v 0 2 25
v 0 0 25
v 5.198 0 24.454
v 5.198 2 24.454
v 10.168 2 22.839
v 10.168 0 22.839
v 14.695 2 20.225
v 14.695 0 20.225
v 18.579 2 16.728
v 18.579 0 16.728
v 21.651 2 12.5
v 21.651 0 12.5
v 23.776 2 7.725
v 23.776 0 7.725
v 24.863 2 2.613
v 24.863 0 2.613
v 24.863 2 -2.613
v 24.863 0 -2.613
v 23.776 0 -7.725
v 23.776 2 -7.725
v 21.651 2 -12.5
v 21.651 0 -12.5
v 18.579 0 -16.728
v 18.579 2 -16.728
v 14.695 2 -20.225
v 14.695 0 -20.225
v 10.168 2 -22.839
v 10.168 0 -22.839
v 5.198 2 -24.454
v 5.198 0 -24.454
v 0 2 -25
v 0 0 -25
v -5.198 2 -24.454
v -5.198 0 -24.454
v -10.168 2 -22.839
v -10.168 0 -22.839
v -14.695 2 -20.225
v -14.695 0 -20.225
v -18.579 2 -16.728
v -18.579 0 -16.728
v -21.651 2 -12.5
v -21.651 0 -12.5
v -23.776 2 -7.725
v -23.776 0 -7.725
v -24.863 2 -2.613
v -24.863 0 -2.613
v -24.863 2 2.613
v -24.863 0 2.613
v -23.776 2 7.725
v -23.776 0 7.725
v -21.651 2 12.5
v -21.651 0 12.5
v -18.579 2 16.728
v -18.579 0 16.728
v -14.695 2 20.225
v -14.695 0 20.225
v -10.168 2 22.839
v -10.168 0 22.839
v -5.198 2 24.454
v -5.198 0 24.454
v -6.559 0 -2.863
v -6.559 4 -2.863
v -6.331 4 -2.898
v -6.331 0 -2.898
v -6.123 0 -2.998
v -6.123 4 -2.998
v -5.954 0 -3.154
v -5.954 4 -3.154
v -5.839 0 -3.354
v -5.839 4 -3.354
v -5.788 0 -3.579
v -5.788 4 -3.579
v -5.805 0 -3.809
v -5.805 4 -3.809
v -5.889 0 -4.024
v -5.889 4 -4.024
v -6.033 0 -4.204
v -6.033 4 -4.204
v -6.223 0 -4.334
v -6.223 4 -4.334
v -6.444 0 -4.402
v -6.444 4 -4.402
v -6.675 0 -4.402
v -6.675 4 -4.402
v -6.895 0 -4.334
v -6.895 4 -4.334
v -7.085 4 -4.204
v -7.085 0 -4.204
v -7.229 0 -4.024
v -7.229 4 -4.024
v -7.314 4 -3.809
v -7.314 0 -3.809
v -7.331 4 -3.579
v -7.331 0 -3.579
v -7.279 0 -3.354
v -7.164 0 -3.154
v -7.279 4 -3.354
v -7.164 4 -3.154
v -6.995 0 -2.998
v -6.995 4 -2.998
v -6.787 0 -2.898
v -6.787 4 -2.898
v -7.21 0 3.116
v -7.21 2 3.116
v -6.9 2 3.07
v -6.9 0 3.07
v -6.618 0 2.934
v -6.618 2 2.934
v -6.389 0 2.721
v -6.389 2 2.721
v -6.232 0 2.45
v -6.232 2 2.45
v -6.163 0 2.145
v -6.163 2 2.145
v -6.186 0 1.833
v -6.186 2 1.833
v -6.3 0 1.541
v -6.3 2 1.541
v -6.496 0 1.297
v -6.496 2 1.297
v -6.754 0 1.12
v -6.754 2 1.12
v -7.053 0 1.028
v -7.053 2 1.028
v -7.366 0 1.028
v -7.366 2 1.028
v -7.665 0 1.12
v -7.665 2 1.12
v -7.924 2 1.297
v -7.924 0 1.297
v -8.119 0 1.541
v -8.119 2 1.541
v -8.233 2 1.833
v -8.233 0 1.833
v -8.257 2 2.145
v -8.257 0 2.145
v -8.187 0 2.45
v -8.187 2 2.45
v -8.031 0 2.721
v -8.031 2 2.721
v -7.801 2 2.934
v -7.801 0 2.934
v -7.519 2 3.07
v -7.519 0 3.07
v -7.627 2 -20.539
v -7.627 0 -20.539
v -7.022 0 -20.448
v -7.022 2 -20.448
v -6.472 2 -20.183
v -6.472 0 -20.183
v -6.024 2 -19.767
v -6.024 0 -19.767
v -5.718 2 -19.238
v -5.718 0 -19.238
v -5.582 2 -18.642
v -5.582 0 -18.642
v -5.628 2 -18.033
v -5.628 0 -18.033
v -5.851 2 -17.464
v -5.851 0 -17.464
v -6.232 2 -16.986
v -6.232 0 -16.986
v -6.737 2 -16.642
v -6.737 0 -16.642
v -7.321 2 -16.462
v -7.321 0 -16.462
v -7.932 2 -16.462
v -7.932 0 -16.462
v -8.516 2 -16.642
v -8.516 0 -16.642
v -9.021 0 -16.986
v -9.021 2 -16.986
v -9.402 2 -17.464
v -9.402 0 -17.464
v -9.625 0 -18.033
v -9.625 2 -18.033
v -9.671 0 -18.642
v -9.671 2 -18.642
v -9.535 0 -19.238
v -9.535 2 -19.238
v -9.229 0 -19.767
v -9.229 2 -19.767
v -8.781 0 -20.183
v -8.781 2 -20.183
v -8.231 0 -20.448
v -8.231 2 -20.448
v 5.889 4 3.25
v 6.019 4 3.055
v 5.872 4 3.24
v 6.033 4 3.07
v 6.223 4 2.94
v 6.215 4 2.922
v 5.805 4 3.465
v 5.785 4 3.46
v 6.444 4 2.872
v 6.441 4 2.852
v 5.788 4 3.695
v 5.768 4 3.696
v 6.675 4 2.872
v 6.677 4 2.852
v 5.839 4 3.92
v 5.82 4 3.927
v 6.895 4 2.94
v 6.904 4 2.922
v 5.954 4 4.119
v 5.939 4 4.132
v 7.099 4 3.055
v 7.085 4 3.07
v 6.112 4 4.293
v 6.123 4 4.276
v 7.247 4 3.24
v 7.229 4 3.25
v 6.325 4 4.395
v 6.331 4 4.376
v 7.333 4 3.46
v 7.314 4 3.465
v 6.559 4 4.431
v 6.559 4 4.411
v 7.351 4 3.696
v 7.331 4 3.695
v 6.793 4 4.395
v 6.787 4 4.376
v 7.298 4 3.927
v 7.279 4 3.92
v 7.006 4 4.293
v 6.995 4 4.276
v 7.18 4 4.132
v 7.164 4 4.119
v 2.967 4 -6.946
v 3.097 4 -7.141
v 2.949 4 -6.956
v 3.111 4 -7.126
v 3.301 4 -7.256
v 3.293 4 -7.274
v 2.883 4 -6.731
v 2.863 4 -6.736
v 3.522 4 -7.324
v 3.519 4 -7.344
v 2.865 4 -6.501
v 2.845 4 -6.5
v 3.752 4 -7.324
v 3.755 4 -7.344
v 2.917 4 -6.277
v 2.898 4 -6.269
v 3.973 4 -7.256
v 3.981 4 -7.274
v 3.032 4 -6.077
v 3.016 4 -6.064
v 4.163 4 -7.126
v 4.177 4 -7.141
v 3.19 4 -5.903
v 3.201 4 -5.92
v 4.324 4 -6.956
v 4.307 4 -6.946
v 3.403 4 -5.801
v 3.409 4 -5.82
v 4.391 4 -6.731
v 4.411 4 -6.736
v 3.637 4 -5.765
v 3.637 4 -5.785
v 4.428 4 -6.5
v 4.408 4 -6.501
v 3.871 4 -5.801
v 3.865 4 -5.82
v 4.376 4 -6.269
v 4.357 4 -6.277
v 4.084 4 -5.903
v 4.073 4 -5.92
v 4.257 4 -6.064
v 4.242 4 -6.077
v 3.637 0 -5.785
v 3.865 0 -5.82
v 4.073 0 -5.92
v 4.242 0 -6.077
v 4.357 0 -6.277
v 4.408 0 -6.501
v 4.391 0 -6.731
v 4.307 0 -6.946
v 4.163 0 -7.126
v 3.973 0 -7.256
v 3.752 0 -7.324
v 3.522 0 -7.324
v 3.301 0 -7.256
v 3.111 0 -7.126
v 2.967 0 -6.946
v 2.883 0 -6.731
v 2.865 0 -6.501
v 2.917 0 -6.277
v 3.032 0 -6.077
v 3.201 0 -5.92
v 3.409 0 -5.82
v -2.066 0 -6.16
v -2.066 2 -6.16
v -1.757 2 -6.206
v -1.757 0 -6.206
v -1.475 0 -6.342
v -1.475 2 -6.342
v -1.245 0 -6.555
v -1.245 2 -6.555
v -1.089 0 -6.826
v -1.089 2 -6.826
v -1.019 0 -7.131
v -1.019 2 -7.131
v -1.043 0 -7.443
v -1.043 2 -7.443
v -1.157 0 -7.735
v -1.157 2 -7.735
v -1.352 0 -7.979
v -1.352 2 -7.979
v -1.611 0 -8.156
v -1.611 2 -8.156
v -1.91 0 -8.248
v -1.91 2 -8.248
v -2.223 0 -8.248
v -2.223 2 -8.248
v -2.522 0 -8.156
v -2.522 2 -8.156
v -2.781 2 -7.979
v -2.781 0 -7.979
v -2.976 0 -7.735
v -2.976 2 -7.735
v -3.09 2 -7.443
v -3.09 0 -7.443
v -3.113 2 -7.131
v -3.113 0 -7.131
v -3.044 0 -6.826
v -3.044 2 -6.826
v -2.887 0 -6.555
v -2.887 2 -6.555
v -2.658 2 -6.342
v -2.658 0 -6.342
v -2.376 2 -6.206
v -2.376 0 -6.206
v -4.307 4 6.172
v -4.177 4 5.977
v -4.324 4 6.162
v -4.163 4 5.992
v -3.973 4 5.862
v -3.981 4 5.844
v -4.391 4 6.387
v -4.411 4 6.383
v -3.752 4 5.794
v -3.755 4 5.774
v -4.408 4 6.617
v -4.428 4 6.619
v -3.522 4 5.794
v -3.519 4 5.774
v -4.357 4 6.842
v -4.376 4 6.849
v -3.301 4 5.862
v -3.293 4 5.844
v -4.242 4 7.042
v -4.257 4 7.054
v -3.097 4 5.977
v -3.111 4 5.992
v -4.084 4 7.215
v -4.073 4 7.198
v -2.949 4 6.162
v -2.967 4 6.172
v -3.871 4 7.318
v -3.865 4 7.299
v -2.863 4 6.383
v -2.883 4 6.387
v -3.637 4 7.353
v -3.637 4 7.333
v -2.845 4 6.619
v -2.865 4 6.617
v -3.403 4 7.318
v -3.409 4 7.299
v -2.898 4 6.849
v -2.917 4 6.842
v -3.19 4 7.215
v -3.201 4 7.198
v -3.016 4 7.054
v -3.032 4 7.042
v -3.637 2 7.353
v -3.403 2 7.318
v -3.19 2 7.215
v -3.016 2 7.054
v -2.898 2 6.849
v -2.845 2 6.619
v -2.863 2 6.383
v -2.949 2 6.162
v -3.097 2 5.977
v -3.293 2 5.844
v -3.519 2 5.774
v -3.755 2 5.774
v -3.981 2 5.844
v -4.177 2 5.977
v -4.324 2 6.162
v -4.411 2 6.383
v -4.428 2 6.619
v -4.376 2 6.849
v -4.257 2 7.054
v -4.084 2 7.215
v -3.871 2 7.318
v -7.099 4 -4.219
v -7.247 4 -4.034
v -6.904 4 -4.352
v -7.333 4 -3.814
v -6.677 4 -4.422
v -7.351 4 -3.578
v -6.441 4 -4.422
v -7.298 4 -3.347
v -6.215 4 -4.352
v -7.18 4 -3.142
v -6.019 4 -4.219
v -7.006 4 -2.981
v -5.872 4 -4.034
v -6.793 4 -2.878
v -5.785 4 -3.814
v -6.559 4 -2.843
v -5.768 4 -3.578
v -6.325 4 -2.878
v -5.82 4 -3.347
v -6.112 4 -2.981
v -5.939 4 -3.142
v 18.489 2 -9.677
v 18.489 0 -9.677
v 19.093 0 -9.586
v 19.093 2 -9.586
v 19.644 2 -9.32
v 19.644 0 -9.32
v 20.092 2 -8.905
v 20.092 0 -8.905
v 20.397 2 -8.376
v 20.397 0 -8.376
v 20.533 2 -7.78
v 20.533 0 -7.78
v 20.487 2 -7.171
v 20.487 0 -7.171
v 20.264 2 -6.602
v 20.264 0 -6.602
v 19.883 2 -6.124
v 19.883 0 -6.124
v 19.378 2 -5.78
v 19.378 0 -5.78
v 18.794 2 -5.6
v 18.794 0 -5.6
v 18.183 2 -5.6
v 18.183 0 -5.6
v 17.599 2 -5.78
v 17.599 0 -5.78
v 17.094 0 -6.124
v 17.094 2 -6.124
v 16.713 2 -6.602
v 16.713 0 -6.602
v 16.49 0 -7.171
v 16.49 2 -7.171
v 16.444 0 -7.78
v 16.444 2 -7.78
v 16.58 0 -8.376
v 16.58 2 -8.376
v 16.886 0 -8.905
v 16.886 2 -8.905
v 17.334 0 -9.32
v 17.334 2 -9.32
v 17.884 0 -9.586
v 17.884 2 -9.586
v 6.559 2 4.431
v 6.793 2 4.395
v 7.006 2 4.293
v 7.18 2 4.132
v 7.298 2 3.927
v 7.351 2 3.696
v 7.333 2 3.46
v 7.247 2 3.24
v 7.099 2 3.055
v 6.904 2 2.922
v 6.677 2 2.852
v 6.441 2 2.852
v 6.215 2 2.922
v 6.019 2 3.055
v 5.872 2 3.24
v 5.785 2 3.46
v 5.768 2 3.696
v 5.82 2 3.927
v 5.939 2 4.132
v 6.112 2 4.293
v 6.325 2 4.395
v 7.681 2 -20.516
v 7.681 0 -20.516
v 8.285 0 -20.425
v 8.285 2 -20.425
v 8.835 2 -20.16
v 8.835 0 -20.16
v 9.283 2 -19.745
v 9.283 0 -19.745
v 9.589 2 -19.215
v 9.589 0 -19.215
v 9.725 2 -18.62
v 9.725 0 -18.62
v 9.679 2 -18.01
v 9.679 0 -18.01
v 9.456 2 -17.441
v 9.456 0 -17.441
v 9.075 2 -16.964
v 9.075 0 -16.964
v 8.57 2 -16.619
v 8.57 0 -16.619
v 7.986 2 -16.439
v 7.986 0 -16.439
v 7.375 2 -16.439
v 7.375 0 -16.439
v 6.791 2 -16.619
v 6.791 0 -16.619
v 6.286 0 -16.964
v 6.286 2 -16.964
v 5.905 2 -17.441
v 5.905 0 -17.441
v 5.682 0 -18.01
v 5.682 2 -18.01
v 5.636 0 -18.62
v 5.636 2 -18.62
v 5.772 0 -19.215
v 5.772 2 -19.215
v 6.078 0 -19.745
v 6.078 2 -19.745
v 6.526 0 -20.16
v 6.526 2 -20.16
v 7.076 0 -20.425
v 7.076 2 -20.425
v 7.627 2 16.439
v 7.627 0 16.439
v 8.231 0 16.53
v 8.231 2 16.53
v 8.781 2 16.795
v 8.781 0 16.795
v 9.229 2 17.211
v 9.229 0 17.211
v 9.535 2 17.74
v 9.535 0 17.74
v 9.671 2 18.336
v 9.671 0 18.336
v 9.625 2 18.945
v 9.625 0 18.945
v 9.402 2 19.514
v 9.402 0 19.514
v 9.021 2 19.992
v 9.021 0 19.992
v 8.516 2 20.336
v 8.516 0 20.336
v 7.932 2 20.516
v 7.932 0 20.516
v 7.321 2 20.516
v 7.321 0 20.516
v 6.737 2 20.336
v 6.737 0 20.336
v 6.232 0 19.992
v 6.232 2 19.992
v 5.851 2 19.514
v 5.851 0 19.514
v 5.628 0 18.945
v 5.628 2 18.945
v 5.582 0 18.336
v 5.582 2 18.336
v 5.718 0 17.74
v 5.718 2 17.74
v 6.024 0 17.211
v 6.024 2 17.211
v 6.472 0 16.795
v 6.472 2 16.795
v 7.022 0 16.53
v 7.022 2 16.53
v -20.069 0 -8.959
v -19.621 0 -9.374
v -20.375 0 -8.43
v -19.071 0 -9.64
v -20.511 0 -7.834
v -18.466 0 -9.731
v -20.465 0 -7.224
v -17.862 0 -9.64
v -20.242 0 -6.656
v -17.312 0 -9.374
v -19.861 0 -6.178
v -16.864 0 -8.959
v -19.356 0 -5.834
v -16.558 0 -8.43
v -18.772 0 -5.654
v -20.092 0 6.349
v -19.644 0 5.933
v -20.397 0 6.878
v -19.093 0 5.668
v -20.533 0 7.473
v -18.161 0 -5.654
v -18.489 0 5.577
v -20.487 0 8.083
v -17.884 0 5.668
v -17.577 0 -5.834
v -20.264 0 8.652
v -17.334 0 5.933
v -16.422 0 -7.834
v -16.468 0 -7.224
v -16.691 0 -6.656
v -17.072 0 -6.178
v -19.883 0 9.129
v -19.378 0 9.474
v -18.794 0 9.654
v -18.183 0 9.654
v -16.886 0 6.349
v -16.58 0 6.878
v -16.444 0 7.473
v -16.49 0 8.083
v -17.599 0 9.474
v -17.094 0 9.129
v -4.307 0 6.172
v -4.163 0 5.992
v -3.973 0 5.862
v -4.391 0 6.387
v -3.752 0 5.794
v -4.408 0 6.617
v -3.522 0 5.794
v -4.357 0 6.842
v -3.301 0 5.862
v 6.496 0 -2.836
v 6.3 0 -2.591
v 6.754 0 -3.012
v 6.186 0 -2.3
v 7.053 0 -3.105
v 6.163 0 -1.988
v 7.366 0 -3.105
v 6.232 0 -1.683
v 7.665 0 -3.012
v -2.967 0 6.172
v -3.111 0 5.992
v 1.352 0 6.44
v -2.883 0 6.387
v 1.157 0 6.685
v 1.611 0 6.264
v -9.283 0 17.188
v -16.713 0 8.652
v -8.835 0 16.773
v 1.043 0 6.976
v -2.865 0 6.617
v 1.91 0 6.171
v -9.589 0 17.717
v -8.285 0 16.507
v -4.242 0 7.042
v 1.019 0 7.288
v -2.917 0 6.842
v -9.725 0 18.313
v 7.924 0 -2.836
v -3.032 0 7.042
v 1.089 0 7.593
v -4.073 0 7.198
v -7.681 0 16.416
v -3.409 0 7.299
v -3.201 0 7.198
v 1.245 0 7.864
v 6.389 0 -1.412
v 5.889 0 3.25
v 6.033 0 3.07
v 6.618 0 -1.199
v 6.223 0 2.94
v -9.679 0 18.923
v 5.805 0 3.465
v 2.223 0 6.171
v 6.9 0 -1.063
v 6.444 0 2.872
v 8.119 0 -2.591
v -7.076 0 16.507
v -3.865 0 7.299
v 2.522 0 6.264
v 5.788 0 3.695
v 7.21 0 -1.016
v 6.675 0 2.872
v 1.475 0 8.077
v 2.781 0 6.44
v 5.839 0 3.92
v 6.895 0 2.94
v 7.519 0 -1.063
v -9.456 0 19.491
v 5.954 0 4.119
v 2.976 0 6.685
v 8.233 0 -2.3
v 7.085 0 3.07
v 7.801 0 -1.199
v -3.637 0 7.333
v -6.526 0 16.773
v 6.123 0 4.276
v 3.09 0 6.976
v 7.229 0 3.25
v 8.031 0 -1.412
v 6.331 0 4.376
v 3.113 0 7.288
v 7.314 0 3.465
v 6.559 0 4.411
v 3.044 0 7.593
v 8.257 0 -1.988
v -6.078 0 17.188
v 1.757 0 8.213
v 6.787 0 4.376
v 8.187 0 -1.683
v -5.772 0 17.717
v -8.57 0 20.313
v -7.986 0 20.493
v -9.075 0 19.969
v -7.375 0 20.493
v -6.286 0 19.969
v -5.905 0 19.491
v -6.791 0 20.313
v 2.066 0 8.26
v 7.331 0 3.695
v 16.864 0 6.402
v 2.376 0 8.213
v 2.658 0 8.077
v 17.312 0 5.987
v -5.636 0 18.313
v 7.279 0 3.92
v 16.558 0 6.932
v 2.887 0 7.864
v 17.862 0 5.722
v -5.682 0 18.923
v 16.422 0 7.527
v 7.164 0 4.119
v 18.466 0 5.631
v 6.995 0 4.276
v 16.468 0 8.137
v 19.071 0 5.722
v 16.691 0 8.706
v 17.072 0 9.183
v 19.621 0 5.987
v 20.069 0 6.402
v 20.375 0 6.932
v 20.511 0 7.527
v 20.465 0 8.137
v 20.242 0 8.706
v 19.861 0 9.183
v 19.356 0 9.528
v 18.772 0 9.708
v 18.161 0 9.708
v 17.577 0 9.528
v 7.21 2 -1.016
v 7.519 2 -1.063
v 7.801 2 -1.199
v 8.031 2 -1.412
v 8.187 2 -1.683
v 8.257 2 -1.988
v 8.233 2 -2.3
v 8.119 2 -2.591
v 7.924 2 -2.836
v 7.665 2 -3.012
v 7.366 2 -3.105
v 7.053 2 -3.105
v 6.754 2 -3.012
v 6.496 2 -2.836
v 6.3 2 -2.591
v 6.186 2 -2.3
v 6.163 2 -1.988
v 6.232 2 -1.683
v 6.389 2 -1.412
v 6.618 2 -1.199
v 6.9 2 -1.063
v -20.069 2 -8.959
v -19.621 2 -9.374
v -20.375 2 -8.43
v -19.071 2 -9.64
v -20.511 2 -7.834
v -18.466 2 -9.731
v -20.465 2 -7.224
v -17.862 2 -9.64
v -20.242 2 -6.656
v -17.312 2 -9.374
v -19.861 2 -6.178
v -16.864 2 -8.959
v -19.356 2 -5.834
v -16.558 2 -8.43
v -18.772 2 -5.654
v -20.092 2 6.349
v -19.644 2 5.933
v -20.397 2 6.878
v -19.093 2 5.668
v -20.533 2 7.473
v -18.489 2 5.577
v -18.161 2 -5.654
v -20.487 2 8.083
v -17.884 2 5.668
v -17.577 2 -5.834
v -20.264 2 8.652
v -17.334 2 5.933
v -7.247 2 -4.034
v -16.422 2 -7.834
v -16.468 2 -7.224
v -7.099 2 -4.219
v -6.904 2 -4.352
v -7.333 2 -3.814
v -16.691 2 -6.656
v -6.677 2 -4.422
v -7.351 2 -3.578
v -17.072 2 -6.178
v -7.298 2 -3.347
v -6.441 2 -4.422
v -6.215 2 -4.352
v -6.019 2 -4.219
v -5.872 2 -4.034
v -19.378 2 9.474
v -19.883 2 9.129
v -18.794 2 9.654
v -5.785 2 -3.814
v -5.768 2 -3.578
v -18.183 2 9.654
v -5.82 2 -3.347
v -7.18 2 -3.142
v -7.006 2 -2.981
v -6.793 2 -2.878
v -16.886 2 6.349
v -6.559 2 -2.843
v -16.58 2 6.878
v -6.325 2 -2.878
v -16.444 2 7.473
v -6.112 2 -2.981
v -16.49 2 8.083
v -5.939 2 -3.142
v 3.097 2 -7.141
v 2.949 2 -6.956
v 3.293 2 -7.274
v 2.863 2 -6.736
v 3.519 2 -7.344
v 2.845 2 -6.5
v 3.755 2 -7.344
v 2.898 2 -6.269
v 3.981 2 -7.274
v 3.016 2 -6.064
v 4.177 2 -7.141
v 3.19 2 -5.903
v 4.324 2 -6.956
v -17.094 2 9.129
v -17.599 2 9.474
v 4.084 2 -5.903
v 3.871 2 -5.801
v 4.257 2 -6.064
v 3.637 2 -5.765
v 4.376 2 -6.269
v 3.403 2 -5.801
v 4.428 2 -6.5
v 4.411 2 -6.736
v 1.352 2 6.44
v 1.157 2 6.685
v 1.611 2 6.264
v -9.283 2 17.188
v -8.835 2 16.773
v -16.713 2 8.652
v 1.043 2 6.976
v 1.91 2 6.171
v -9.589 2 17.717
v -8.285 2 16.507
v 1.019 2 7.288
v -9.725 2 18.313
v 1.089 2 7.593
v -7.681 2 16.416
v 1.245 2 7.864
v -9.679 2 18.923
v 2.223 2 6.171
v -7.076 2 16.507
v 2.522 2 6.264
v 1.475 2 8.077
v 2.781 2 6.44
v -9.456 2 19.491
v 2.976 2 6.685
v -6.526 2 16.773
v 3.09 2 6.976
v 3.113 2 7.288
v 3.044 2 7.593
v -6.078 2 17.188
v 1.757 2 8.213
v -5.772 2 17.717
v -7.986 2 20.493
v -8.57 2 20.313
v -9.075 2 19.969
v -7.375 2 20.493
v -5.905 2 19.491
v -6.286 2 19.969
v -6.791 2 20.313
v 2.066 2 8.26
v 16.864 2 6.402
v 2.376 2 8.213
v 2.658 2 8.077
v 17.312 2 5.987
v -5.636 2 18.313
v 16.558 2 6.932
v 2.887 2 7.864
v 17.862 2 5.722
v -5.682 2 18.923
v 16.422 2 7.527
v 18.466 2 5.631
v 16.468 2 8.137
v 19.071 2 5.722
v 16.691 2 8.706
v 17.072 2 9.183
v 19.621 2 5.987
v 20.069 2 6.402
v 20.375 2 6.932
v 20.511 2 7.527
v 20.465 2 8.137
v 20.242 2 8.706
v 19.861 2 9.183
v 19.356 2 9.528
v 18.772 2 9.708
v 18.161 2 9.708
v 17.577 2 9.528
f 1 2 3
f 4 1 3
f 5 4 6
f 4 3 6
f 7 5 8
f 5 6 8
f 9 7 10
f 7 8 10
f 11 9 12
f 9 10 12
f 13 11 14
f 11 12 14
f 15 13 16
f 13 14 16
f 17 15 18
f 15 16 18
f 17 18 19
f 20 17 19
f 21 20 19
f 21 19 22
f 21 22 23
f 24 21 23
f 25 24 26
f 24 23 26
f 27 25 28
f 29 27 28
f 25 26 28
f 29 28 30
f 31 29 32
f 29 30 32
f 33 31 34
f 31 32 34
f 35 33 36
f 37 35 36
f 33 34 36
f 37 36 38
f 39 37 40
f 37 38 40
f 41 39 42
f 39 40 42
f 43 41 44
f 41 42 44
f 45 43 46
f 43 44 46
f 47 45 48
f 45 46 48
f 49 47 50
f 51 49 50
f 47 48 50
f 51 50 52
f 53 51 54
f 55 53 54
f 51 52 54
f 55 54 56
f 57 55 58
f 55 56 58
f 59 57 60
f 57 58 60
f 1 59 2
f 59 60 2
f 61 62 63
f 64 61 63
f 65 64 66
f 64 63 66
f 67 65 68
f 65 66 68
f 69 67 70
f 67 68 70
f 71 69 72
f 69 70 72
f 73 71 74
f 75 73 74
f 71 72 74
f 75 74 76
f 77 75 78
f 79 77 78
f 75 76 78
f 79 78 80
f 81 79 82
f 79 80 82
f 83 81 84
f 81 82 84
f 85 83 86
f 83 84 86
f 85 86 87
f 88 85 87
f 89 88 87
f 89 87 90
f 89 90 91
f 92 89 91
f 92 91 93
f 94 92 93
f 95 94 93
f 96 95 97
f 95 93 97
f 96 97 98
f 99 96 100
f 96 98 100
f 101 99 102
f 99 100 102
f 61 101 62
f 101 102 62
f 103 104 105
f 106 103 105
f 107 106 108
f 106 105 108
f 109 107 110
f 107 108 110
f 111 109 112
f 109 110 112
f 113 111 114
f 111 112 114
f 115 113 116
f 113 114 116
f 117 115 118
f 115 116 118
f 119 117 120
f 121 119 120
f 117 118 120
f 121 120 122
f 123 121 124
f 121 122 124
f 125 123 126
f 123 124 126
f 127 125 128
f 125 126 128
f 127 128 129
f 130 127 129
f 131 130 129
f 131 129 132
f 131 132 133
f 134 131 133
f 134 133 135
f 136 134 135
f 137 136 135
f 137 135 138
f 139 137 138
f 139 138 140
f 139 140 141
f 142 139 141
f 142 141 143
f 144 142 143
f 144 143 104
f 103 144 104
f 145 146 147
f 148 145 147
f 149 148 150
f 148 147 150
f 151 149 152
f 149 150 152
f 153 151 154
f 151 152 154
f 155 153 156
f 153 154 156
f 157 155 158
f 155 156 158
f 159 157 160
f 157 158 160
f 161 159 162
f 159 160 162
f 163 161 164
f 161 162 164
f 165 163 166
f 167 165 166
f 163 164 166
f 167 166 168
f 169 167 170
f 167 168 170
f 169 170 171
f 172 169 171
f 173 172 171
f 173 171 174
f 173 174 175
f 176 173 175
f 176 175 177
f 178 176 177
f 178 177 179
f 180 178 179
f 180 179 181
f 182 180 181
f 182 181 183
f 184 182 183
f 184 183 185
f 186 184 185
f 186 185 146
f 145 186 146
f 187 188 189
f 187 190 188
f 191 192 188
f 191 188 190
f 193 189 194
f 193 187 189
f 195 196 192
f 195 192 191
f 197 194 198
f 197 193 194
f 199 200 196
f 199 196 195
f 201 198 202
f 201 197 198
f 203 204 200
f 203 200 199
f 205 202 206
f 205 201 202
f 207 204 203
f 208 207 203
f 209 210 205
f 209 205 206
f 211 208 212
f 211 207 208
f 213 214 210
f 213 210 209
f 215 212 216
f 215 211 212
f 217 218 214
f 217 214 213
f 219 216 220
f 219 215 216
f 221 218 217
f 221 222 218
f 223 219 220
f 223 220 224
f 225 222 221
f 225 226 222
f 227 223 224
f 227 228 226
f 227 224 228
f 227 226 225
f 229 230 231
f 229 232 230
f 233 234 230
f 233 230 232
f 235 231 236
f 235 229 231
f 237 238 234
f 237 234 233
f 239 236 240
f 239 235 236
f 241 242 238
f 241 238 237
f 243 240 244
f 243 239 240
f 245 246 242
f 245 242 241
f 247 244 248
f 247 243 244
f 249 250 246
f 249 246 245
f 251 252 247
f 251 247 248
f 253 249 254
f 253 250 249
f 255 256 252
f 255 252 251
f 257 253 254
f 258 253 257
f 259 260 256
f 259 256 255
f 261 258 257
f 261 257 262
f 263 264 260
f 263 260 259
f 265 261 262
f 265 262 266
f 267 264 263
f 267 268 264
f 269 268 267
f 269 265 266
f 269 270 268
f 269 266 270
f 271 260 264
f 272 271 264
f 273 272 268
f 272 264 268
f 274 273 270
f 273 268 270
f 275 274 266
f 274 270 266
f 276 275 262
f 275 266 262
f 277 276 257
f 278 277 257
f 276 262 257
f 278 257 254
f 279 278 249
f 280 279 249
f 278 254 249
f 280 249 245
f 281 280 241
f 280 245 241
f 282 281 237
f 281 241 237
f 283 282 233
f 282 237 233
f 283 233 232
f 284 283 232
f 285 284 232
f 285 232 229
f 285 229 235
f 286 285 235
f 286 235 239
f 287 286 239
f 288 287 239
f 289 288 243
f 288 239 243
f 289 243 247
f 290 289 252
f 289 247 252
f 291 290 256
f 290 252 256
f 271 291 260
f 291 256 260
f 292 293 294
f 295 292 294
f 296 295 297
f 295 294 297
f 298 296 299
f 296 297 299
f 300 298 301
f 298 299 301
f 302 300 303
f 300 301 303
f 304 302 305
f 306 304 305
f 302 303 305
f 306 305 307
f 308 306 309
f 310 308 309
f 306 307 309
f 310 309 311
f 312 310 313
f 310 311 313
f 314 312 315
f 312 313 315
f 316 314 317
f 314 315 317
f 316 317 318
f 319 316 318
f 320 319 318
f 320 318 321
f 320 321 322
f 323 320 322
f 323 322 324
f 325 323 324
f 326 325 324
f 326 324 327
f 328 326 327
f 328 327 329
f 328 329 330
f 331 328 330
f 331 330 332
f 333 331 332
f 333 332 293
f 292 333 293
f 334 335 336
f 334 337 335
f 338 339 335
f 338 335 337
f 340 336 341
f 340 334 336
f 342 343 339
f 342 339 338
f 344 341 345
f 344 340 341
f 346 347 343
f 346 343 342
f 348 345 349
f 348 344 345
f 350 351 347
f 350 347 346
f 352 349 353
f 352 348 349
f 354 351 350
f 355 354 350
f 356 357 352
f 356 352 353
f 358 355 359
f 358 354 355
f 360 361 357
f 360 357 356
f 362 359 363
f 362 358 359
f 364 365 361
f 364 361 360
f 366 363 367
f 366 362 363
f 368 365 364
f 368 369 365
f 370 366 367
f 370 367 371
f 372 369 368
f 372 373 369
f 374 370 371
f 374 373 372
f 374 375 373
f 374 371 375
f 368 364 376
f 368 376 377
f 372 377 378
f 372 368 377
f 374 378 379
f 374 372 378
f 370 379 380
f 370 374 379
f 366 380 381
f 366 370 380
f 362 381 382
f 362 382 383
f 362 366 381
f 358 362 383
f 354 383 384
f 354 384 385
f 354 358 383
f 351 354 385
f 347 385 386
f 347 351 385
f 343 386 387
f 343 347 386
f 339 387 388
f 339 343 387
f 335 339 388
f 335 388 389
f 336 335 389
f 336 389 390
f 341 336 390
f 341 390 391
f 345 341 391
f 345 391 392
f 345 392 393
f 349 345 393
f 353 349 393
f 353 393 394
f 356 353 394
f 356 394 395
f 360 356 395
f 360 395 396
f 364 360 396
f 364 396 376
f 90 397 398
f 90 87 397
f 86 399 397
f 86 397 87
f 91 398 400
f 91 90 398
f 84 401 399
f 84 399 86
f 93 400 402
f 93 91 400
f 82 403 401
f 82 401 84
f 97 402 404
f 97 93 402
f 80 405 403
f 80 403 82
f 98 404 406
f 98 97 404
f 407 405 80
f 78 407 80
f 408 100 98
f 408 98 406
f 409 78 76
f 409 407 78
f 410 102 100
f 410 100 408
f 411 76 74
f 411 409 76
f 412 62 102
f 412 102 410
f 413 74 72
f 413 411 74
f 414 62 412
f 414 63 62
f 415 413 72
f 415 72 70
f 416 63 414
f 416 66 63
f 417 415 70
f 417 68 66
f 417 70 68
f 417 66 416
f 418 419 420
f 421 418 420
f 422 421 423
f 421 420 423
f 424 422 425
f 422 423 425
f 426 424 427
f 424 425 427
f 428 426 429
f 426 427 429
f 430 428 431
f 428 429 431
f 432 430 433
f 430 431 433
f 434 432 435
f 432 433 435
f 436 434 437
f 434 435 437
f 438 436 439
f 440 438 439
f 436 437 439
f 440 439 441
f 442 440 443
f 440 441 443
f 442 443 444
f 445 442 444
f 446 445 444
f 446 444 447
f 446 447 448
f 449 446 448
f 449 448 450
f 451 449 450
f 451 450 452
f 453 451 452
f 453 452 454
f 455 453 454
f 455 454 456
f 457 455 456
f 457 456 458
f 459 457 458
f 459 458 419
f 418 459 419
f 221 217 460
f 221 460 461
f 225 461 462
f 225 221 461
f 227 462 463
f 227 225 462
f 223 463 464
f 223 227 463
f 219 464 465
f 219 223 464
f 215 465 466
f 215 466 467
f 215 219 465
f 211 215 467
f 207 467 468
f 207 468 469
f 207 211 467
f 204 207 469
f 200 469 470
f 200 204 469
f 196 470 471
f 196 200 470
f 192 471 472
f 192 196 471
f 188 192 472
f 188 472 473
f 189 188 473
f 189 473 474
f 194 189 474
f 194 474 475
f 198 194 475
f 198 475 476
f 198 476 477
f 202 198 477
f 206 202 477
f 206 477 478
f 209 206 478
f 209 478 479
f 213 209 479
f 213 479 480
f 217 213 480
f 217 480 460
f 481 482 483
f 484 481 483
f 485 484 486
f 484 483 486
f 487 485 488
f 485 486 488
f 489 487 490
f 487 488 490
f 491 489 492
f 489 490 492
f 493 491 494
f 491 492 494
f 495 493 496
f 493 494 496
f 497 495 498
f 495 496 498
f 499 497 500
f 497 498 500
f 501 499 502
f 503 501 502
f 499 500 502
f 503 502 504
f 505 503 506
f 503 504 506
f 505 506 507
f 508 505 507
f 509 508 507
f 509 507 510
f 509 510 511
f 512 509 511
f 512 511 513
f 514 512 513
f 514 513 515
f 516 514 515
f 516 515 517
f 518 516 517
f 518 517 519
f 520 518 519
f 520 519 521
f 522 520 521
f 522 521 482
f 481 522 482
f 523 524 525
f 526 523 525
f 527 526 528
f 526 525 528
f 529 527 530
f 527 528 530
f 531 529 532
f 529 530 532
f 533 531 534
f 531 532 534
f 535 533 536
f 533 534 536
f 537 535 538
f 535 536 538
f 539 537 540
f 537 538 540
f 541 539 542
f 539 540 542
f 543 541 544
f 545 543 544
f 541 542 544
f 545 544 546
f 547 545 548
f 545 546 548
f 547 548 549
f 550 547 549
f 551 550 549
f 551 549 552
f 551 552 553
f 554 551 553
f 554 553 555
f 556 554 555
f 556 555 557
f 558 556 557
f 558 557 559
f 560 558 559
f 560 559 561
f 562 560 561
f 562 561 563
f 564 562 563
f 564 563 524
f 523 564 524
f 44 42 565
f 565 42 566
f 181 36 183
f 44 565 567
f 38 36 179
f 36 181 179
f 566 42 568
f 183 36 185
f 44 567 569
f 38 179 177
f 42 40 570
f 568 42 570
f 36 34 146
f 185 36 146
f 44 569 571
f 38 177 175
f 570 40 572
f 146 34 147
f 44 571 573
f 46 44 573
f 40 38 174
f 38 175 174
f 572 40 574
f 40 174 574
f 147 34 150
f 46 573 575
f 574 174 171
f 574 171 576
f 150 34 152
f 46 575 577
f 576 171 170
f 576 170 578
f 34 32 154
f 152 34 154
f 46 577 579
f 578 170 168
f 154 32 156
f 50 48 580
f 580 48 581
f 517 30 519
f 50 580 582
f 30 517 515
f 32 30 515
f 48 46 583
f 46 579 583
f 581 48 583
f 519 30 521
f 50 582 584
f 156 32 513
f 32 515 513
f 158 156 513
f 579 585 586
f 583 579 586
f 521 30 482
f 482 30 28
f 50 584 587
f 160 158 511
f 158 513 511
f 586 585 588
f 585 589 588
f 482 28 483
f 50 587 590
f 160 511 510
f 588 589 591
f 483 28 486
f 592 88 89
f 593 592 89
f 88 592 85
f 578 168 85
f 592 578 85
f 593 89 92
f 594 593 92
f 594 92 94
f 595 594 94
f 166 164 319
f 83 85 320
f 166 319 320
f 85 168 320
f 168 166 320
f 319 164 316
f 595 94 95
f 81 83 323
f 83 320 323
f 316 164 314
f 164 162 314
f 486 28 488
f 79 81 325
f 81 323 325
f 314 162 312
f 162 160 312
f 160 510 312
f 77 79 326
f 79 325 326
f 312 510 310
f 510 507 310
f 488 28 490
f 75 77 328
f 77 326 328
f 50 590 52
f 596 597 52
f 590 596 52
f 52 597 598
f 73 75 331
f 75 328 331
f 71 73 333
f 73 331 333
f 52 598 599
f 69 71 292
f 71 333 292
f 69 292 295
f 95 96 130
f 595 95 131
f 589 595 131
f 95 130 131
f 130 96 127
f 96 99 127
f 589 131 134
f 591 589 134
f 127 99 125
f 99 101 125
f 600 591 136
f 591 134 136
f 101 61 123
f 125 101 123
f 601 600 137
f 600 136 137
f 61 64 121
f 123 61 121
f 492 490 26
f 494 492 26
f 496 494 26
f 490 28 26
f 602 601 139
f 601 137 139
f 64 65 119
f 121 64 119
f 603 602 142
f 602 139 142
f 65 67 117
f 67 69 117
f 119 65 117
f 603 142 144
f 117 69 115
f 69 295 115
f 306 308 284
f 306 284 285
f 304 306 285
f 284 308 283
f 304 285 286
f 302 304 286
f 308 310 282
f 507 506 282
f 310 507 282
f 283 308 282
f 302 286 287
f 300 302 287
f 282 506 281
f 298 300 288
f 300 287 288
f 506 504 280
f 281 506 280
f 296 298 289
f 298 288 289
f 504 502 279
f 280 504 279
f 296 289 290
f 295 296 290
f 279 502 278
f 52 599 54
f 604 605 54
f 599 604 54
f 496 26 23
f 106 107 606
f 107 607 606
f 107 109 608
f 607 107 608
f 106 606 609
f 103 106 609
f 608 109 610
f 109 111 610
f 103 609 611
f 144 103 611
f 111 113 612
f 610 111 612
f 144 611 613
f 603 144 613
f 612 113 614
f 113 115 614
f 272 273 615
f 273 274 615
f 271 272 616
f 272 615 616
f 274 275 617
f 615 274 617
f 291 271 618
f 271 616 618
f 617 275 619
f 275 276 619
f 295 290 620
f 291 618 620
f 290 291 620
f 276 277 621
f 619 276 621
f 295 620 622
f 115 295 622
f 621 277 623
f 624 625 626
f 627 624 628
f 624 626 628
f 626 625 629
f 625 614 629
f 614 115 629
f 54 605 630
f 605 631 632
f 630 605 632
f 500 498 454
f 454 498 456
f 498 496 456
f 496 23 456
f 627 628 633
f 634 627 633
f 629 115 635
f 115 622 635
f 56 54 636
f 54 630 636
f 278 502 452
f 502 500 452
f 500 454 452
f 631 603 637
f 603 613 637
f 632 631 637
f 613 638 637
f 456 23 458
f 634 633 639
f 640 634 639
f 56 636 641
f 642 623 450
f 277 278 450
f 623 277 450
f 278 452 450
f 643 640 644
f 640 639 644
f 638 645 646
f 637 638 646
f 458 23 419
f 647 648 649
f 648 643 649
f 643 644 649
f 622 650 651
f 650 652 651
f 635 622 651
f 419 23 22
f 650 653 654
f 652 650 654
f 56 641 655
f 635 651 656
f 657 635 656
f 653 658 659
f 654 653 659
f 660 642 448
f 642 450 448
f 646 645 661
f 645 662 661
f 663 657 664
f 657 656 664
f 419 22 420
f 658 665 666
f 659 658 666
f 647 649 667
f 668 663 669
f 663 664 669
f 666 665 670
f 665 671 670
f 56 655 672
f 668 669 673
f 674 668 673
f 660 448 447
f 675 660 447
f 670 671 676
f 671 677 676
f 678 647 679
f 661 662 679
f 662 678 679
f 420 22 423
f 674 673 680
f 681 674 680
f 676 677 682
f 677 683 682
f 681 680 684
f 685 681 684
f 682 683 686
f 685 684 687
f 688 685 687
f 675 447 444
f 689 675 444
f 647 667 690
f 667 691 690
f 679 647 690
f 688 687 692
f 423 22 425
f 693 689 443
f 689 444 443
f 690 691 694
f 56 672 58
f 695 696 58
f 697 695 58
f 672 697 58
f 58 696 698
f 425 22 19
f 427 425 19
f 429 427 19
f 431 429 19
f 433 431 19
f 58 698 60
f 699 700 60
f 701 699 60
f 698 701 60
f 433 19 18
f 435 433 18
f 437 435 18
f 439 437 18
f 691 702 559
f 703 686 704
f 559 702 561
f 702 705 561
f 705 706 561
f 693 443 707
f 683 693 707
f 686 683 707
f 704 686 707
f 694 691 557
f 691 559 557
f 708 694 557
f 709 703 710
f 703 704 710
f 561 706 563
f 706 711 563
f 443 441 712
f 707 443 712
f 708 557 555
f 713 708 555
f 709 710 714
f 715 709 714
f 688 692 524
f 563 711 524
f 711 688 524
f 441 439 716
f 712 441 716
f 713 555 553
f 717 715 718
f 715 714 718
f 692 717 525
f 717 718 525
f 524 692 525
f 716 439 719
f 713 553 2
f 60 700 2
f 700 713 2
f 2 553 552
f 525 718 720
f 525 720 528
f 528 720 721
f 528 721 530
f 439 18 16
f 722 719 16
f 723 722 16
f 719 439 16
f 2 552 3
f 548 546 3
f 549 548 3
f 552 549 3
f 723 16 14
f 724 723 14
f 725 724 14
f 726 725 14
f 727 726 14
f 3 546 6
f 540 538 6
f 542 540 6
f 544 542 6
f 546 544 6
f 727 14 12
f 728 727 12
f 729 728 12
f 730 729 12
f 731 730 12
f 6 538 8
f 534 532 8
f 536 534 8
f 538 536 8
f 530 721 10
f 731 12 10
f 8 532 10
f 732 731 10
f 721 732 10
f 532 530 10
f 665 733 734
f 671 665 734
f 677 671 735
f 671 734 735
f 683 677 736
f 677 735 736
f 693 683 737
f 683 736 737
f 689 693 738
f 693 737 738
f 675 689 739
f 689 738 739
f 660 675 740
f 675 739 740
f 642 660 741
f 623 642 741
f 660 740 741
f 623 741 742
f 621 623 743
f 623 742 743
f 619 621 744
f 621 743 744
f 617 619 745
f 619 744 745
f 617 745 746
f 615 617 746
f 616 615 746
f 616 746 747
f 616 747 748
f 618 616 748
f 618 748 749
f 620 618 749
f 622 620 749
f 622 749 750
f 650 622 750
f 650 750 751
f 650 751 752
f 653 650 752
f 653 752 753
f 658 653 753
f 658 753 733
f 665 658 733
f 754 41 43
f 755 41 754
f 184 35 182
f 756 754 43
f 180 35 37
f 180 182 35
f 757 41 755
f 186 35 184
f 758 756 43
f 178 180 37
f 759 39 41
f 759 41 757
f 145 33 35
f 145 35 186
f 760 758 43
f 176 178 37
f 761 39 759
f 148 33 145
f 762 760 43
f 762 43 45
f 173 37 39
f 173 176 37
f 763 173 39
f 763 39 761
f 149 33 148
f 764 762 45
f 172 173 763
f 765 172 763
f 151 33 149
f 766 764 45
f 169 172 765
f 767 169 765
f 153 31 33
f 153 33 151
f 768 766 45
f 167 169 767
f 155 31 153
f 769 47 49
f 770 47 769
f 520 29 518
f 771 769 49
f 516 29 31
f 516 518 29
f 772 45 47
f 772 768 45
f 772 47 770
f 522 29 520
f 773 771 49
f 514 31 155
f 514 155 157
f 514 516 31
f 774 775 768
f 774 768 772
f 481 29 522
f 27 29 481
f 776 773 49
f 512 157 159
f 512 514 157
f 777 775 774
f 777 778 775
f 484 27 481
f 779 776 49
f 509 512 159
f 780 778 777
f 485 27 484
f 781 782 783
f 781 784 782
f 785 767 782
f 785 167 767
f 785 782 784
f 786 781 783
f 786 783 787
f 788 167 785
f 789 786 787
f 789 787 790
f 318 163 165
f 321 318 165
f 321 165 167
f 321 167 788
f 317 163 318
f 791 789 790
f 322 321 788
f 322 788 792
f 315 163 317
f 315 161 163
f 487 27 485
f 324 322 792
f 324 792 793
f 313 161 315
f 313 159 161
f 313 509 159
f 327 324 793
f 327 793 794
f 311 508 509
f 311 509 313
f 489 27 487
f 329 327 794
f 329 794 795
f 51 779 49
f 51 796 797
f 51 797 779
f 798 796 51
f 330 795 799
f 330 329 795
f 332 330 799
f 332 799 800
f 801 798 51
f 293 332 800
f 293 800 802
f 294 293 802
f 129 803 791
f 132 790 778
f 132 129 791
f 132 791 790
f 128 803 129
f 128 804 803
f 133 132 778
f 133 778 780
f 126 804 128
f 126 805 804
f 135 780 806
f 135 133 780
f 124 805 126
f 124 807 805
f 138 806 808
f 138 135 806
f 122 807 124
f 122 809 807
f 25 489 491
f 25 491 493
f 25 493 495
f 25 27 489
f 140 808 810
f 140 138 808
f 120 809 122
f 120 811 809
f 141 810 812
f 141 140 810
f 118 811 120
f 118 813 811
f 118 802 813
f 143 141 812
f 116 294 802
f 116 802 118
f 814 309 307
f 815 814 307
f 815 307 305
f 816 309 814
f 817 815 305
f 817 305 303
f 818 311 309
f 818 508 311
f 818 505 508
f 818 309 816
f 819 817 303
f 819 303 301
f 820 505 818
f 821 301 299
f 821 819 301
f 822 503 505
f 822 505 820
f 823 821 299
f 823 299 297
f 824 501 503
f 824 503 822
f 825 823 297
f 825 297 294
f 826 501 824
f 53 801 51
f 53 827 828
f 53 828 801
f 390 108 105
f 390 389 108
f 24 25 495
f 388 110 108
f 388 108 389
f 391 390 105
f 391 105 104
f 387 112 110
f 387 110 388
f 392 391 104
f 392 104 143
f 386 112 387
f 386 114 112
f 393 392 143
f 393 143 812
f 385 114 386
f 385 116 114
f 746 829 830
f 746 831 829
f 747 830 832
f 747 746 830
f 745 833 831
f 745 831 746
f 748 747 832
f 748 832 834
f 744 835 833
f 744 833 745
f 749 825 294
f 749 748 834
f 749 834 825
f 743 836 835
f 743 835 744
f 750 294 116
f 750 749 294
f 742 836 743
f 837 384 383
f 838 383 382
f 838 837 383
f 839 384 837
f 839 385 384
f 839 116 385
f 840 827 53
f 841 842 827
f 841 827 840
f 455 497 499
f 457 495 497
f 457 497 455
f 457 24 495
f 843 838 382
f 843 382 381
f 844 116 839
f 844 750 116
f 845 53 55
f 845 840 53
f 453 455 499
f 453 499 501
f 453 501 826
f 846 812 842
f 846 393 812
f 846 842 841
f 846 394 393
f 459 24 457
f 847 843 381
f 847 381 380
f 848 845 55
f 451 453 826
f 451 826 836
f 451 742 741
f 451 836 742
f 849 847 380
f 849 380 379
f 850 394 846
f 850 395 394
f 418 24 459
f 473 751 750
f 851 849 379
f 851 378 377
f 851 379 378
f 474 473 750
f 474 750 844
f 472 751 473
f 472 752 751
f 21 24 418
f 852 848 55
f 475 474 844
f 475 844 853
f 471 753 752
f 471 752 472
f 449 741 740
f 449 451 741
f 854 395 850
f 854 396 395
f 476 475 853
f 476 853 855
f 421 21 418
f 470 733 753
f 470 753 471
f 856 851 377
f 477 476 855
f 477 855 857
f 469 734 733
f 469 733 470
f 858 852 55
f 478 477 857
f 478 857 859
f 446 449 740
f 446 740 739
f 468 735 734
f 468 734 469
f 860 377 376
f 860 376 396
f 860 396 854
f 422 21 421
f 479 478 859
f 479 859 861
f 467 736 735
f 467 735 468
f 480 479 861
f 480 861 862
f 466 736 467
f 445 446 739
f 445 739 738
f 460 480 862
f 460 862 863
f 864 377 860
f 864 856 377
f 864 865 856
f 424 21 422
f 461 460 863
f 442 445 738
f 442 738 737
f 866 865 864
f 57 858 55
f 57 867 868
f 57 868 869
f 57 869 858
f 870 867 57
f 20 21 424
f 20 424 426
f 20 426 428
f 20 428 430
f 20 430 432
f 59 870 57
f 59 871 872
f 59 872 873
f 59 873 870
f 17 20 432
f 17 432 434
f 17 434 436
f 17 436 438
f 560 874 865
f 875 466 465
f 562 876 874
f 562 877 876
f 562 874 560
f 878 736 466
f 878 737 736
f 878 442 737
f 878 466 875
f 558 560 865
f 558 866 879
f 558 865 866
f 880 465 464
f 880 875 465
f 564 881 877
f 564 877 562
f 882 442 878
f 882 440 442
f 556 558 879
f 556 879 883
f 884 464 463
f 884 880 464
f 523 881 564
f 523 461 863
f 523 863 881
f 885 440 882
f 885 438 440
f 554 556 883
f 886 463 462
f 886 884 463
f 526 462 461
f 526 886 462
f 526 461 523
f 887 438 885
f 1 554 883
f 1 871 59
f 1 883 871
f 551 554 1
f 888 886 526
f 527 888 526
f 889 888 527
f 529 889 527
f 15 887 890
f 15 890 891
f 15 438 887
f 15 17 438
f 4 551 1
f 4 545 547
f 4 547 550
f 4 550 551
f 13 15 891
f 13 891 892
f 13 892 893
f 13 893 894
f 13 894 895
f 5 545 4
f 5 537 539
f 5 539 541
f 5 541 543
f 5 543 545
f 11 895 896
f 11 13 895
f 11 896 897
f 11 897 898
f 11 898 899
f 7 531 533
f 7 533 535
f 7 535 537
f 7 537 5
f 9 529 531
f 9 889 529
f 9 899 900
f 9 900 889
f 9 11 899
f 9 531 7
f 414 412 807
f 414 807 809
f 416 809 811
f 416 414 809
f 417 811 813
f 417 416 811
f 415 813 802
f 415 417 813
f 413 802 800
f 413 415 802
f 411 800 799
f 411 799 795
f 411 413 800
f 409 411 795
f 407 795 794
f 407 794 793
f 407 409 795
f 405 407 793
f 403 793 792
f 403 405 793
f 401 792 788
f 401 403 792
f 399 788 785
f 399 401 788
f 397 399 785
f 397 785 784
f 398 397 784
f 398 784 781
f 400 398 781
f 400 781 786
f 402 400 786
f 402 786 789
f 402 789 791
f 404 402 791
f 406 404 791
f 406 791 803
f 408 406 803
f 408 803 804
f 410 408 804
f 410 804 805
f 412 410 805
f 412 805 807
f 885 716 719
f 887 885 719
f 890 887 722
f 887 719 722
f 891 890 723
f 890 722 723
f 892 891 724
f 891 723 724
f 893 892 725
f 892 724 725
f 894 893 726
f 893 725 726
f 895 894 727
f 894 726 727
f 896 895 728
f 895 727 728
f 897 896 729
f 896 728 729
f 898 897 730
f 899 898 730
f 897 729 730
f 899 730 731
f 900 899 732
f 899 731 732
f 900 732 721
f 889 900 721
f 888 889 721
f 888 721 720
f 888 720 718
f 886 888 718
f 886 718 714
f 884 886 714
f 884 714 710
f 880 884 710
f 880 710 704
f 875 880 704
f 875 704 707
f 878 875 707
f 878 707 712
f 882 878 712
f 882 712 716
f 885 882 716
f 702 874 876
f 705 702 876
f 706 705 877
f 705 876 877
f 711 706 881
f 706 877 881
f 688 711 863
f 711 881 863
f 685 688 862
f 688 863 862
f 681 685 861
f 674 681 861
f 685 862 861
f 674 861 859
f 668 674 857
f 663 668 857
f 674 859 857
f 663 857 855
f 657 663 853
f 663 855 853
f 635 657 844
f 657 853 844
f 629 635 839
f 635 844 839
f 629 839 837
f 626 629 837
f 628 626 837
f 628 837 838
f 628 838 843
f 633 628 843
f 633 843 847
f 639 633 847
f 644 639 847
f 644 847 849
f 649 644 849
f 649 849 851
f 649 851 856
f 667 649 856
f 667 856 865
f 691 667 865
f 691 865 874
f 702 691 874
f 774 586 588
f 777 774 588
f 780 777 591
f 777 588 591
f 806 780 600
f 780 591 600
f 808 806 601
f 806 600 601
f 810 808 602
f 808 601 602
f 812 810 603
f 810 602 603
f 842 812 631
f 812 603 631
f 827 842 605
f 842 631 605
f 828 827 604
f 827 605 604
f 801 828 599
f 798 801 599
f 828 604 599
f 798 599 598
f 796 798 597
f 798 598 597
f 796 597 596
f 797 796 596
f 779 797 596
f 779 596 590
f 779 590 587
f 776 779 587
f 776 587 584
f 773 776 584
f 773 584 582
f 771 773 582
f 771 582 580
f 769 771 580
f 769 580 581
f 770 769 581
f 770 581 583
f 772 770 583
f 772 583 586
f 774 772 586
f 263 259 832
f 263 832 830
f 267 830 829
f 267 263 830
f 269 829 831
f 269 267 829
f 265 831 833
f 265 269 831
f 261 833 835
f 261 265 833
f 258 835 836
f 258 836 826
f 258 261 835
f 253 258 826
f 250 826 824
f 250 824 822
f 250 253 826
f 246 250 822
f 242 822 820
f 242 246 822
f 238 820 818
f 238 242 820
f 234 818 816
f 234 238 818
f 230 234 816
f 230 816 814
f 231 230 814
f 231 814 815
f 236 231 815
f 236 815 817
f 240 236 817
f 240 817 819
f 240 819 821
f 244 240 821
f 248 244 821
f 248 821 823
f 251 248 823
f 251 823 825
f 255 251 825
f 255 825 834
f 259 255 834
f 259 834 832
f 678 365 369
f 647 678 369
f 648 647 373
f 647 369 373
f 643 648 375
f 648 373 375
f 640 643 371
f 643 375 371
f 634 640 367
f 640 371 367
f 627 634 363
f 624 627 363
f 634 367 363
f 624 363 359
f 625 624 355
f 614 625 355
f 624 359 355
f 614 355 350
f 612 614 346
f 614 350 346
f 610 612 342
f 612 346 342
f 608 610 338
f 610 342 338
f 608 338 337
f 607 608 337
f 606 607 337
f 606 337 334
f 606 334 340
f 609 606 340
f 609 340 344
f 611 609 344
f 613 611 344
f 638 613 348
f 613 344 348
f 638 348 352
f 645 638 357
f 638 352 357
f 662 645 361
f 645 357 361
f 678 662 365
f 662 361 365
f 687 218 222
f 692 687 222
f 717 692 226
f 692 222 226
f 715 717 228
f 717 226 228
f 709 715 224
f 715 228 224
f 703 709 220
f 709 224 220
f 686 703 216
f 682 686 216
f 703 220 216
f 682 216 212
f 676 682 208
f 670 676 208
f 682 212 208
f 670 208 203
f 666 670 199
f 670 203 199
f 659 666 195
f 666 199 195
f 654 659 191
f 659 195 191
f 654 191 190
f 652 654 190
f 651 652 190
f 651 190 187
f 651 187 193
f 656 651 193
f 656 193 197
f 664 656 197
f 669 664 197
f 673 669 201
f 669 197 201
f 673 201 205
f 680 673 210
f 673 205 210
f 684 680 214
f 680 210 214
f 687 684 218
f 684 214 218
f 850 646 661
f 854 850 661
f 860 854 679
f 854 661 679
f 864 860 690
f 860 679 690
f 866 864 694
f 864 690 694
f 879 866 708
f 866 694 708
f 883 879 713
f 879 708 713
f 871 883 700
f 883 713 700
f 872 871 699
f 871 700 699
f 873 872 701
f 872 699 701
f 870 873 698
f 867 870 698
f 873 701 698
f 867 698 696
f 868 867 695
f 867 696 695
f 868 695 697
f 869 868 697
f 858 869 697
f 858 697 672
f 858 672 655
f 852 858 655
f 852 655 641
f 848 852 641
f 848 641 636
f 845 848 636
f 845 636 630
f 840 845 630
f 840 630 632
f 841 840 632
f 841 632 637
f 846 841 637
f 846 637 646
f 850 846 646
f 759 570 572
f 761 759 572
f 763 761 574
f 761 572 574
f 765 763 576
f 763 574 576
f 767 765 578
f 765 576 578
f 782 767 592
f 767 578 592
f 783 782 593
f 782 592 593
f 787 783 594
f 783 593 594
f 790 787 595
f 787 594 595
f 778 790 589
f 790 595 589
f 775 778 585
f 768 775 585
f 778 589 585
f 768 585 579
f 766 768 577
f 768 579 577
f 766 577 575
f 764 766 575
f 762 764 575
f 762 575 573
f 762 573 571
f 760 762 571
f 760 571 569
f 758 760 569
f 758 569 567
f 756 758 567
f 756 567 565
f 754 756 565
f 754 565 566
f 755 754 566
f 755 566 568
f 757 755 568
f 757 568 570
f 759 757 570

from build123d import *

# Parameters (mm, degrees)
SKETCH1_R           = 25
BOSS_EXTRUDE1_DEPTH = 2
SKETCH2_R           = 1.05
SKETCH2_R_2         = 0.79375
CUT_EXTRUDE1_DEPTH  = 36.411862419
SKETCH4_R           = 2.05
CUT_EXTRUDE3_DEPTH  = 36.411862419
BOSS_EXTRUDE2_START = 4
SKETCH7_R           = 0.79375
SKETCH7_R_2         = 0.77375
BOSS_EXTRUDE2_DEPTH = 4


with BuildPart() as part:
    # Sketch1 → Boss-Extrude1 (new body)
    with BuildSketch(Plane(origin=(0, 0, 0), x_dir=(1, 0, 0), z_dir=(0, 1, 0))):
        with Locations(Location((0, 0, 0), (0, 0, 270))):
            Circle(SKETCH1_R)
    extrude(amount=BOSS_EXTRUDE1_DEPTH)

    # Sketch2 → Cut-Extrude1 (cut, through all)
    with BuildSketch(Plane(origin=(0, 2, 0), x_dir=(1, 0, 0), z_dir=(0, 1, 0))):
        with Locations(Location((-2.066368974, 7.209723938, 0), (0, 0, 270))):
            Circle(SKETCH2_R)
        with Locations(Location((7.209723938, 2.066368974, 0), (0, 0, 270))):
            Circle(SKETCH2_R)
        with Locations(Location((2.066368974, -7.209723938, 0), (0, 0, 270))):
            Circle(SKETCH2_R)
        with Locations(Location((-7.209723938, -2.066368974, 0), (0, 0, 270))):
            Circle(SKETCH2_R)
        with Locations(Location((-3.636901173, -6.559188201, 0), (0, 0, 270))):
            Circle(SKETCH2_R_2)
        with Locations(Location((-6.559188201, 3.636901173, 0), (0, 0, 270))):
            Circle(SKETCH2_R_2)
        with Locations(Location((3.636901173, 6.559188201, 0), (0, 0, 270))):
            Circle(SKETCH2_R_2)
        with Locations(Location((6.559188201, -3.636901173, 0), (0, 0, 270))):
            Circle(SKETCH2_R_2)
    extrude(amount=-CUT_EXTRUDE1_DEPTH, mode=Mode.SUBTRACT)

    # Sketch4 → Cut-Extrude3 (cut, through all)
    with BuildSketch(Plane.XZ):
        with Locations(Location((-18.488747294, 7.626678405, 0), (0, 0, 270))):
            Circle(SKETCH4_R)
        with Locations(Location((-7.680642569, 18.466394605, 0), (0, 0, 270))):
            Circle(SKETCH4_R)
        with Locations(Location((7.626678405, 18.488747294, 0), (0, 0, 270))):
            Circle(SKETCH4_R)
        with Locations(Location((18.466394605, 7.680642569, 0), (0, 0, 270))):
            Circle(SKETCH4_R)
        with Locations(Location((18.488747294, -7.626678405, 0), (0, 0, 270))):
            Circle(SKETCH4_R)
        with Locations(Location((7.680642569, -18.466394605, 0), (0, 0, 270))):
            Circle(SKETCH4_R)
        with Locations(Location((-7.626678405, -18.488747294, 0), (0, 0, 270))):
            Circle(SKETCH4_R)
        with Locations(Location((-18.466394605, -7.680642569, 0), (0, 0, 270))):
            Circle(SKETCH4_R)
    extrude(amount=-CUT_EXTRUDE3_DEPTH, mode=Mode.SUBTRACT)

    # Sketch7 → Boss-Extrude2 (add)
    # profile 1 of 4: a face of its own
    with BuildSketch(Plane(origin=(0, 0, 0), x_dir=(1, 0, 0), z_dir=(0, 1, 0)).offset(BOSS_EXTRUDE2_START)):
        with Locations(Location((-3.636901173, -6.559188201, 0), (0, 0, 270))):
            Circle(SKETCH7_R)
        with Locations(Location((-3.636901173, -6.559188201, 0), (0, 0, 270))):
            Circle(SKETCH7_R_2, mode=Mode.SUBTRACT)
    # profile 2 of 4: a face of its own
    with BuildSketch(Plane(origin=(0, 0, 0), x_dir=(1, 0, 0), z_dir=(0, 1, 0)).offset(BOSS_EXTRUDE2_START)):
        with Locations(Location((6.559188201, -3.636901173, 0), (0, 0, 270))):
            Circle(SKETCH7_R)
        with Locations(Location((6.559188201, -3.636901173, 0), (0, 0, 270))):
            Circle(SKETCH7_R_2, mode=Mode.SUBTRACT)
    # profile 3 of 4: a face of its own
    with BuildSketch(Plane(origin=(0, 0, 0), x_dir=(1, 0, 0), z_dir=(0, 1, 0)).offset(BOSS_EXTRUDE2_START)):
        with Locations(Location((-6.559188201, 3.636901173, 0), (0, 0, 270))):
            Circle(SKETCH7_R)
        with Locations(Location((-6.559188201, 3.636901173, 0), (0, 0, 270))):
            Circle(SKETCH7_R_2, mode=Mode.SUBTRACT)
    # profile 4 of 4: a face of its own
    with BuildSketch(Plane(origin=(0, 0, 0), x_dir=(1, 0, 0), z_dir=(0, 1, 0)).offset(BOSS_EXTRUDE2_START)):
        with Locations(Location((3.636901173, 6.559188201, 0), (0, 0, 270))):
            Circle(SKETCH7_R)
        with Locations(Location((3.636901173, 6.559188201, 0), (0, 0, 270))):
            Circle(SKETCH7_R_2, mode=Mode.SUBTRACT)
    extrude(amount=-BOSS_EXTRUDE2_DEPTH)


solid = part.part
